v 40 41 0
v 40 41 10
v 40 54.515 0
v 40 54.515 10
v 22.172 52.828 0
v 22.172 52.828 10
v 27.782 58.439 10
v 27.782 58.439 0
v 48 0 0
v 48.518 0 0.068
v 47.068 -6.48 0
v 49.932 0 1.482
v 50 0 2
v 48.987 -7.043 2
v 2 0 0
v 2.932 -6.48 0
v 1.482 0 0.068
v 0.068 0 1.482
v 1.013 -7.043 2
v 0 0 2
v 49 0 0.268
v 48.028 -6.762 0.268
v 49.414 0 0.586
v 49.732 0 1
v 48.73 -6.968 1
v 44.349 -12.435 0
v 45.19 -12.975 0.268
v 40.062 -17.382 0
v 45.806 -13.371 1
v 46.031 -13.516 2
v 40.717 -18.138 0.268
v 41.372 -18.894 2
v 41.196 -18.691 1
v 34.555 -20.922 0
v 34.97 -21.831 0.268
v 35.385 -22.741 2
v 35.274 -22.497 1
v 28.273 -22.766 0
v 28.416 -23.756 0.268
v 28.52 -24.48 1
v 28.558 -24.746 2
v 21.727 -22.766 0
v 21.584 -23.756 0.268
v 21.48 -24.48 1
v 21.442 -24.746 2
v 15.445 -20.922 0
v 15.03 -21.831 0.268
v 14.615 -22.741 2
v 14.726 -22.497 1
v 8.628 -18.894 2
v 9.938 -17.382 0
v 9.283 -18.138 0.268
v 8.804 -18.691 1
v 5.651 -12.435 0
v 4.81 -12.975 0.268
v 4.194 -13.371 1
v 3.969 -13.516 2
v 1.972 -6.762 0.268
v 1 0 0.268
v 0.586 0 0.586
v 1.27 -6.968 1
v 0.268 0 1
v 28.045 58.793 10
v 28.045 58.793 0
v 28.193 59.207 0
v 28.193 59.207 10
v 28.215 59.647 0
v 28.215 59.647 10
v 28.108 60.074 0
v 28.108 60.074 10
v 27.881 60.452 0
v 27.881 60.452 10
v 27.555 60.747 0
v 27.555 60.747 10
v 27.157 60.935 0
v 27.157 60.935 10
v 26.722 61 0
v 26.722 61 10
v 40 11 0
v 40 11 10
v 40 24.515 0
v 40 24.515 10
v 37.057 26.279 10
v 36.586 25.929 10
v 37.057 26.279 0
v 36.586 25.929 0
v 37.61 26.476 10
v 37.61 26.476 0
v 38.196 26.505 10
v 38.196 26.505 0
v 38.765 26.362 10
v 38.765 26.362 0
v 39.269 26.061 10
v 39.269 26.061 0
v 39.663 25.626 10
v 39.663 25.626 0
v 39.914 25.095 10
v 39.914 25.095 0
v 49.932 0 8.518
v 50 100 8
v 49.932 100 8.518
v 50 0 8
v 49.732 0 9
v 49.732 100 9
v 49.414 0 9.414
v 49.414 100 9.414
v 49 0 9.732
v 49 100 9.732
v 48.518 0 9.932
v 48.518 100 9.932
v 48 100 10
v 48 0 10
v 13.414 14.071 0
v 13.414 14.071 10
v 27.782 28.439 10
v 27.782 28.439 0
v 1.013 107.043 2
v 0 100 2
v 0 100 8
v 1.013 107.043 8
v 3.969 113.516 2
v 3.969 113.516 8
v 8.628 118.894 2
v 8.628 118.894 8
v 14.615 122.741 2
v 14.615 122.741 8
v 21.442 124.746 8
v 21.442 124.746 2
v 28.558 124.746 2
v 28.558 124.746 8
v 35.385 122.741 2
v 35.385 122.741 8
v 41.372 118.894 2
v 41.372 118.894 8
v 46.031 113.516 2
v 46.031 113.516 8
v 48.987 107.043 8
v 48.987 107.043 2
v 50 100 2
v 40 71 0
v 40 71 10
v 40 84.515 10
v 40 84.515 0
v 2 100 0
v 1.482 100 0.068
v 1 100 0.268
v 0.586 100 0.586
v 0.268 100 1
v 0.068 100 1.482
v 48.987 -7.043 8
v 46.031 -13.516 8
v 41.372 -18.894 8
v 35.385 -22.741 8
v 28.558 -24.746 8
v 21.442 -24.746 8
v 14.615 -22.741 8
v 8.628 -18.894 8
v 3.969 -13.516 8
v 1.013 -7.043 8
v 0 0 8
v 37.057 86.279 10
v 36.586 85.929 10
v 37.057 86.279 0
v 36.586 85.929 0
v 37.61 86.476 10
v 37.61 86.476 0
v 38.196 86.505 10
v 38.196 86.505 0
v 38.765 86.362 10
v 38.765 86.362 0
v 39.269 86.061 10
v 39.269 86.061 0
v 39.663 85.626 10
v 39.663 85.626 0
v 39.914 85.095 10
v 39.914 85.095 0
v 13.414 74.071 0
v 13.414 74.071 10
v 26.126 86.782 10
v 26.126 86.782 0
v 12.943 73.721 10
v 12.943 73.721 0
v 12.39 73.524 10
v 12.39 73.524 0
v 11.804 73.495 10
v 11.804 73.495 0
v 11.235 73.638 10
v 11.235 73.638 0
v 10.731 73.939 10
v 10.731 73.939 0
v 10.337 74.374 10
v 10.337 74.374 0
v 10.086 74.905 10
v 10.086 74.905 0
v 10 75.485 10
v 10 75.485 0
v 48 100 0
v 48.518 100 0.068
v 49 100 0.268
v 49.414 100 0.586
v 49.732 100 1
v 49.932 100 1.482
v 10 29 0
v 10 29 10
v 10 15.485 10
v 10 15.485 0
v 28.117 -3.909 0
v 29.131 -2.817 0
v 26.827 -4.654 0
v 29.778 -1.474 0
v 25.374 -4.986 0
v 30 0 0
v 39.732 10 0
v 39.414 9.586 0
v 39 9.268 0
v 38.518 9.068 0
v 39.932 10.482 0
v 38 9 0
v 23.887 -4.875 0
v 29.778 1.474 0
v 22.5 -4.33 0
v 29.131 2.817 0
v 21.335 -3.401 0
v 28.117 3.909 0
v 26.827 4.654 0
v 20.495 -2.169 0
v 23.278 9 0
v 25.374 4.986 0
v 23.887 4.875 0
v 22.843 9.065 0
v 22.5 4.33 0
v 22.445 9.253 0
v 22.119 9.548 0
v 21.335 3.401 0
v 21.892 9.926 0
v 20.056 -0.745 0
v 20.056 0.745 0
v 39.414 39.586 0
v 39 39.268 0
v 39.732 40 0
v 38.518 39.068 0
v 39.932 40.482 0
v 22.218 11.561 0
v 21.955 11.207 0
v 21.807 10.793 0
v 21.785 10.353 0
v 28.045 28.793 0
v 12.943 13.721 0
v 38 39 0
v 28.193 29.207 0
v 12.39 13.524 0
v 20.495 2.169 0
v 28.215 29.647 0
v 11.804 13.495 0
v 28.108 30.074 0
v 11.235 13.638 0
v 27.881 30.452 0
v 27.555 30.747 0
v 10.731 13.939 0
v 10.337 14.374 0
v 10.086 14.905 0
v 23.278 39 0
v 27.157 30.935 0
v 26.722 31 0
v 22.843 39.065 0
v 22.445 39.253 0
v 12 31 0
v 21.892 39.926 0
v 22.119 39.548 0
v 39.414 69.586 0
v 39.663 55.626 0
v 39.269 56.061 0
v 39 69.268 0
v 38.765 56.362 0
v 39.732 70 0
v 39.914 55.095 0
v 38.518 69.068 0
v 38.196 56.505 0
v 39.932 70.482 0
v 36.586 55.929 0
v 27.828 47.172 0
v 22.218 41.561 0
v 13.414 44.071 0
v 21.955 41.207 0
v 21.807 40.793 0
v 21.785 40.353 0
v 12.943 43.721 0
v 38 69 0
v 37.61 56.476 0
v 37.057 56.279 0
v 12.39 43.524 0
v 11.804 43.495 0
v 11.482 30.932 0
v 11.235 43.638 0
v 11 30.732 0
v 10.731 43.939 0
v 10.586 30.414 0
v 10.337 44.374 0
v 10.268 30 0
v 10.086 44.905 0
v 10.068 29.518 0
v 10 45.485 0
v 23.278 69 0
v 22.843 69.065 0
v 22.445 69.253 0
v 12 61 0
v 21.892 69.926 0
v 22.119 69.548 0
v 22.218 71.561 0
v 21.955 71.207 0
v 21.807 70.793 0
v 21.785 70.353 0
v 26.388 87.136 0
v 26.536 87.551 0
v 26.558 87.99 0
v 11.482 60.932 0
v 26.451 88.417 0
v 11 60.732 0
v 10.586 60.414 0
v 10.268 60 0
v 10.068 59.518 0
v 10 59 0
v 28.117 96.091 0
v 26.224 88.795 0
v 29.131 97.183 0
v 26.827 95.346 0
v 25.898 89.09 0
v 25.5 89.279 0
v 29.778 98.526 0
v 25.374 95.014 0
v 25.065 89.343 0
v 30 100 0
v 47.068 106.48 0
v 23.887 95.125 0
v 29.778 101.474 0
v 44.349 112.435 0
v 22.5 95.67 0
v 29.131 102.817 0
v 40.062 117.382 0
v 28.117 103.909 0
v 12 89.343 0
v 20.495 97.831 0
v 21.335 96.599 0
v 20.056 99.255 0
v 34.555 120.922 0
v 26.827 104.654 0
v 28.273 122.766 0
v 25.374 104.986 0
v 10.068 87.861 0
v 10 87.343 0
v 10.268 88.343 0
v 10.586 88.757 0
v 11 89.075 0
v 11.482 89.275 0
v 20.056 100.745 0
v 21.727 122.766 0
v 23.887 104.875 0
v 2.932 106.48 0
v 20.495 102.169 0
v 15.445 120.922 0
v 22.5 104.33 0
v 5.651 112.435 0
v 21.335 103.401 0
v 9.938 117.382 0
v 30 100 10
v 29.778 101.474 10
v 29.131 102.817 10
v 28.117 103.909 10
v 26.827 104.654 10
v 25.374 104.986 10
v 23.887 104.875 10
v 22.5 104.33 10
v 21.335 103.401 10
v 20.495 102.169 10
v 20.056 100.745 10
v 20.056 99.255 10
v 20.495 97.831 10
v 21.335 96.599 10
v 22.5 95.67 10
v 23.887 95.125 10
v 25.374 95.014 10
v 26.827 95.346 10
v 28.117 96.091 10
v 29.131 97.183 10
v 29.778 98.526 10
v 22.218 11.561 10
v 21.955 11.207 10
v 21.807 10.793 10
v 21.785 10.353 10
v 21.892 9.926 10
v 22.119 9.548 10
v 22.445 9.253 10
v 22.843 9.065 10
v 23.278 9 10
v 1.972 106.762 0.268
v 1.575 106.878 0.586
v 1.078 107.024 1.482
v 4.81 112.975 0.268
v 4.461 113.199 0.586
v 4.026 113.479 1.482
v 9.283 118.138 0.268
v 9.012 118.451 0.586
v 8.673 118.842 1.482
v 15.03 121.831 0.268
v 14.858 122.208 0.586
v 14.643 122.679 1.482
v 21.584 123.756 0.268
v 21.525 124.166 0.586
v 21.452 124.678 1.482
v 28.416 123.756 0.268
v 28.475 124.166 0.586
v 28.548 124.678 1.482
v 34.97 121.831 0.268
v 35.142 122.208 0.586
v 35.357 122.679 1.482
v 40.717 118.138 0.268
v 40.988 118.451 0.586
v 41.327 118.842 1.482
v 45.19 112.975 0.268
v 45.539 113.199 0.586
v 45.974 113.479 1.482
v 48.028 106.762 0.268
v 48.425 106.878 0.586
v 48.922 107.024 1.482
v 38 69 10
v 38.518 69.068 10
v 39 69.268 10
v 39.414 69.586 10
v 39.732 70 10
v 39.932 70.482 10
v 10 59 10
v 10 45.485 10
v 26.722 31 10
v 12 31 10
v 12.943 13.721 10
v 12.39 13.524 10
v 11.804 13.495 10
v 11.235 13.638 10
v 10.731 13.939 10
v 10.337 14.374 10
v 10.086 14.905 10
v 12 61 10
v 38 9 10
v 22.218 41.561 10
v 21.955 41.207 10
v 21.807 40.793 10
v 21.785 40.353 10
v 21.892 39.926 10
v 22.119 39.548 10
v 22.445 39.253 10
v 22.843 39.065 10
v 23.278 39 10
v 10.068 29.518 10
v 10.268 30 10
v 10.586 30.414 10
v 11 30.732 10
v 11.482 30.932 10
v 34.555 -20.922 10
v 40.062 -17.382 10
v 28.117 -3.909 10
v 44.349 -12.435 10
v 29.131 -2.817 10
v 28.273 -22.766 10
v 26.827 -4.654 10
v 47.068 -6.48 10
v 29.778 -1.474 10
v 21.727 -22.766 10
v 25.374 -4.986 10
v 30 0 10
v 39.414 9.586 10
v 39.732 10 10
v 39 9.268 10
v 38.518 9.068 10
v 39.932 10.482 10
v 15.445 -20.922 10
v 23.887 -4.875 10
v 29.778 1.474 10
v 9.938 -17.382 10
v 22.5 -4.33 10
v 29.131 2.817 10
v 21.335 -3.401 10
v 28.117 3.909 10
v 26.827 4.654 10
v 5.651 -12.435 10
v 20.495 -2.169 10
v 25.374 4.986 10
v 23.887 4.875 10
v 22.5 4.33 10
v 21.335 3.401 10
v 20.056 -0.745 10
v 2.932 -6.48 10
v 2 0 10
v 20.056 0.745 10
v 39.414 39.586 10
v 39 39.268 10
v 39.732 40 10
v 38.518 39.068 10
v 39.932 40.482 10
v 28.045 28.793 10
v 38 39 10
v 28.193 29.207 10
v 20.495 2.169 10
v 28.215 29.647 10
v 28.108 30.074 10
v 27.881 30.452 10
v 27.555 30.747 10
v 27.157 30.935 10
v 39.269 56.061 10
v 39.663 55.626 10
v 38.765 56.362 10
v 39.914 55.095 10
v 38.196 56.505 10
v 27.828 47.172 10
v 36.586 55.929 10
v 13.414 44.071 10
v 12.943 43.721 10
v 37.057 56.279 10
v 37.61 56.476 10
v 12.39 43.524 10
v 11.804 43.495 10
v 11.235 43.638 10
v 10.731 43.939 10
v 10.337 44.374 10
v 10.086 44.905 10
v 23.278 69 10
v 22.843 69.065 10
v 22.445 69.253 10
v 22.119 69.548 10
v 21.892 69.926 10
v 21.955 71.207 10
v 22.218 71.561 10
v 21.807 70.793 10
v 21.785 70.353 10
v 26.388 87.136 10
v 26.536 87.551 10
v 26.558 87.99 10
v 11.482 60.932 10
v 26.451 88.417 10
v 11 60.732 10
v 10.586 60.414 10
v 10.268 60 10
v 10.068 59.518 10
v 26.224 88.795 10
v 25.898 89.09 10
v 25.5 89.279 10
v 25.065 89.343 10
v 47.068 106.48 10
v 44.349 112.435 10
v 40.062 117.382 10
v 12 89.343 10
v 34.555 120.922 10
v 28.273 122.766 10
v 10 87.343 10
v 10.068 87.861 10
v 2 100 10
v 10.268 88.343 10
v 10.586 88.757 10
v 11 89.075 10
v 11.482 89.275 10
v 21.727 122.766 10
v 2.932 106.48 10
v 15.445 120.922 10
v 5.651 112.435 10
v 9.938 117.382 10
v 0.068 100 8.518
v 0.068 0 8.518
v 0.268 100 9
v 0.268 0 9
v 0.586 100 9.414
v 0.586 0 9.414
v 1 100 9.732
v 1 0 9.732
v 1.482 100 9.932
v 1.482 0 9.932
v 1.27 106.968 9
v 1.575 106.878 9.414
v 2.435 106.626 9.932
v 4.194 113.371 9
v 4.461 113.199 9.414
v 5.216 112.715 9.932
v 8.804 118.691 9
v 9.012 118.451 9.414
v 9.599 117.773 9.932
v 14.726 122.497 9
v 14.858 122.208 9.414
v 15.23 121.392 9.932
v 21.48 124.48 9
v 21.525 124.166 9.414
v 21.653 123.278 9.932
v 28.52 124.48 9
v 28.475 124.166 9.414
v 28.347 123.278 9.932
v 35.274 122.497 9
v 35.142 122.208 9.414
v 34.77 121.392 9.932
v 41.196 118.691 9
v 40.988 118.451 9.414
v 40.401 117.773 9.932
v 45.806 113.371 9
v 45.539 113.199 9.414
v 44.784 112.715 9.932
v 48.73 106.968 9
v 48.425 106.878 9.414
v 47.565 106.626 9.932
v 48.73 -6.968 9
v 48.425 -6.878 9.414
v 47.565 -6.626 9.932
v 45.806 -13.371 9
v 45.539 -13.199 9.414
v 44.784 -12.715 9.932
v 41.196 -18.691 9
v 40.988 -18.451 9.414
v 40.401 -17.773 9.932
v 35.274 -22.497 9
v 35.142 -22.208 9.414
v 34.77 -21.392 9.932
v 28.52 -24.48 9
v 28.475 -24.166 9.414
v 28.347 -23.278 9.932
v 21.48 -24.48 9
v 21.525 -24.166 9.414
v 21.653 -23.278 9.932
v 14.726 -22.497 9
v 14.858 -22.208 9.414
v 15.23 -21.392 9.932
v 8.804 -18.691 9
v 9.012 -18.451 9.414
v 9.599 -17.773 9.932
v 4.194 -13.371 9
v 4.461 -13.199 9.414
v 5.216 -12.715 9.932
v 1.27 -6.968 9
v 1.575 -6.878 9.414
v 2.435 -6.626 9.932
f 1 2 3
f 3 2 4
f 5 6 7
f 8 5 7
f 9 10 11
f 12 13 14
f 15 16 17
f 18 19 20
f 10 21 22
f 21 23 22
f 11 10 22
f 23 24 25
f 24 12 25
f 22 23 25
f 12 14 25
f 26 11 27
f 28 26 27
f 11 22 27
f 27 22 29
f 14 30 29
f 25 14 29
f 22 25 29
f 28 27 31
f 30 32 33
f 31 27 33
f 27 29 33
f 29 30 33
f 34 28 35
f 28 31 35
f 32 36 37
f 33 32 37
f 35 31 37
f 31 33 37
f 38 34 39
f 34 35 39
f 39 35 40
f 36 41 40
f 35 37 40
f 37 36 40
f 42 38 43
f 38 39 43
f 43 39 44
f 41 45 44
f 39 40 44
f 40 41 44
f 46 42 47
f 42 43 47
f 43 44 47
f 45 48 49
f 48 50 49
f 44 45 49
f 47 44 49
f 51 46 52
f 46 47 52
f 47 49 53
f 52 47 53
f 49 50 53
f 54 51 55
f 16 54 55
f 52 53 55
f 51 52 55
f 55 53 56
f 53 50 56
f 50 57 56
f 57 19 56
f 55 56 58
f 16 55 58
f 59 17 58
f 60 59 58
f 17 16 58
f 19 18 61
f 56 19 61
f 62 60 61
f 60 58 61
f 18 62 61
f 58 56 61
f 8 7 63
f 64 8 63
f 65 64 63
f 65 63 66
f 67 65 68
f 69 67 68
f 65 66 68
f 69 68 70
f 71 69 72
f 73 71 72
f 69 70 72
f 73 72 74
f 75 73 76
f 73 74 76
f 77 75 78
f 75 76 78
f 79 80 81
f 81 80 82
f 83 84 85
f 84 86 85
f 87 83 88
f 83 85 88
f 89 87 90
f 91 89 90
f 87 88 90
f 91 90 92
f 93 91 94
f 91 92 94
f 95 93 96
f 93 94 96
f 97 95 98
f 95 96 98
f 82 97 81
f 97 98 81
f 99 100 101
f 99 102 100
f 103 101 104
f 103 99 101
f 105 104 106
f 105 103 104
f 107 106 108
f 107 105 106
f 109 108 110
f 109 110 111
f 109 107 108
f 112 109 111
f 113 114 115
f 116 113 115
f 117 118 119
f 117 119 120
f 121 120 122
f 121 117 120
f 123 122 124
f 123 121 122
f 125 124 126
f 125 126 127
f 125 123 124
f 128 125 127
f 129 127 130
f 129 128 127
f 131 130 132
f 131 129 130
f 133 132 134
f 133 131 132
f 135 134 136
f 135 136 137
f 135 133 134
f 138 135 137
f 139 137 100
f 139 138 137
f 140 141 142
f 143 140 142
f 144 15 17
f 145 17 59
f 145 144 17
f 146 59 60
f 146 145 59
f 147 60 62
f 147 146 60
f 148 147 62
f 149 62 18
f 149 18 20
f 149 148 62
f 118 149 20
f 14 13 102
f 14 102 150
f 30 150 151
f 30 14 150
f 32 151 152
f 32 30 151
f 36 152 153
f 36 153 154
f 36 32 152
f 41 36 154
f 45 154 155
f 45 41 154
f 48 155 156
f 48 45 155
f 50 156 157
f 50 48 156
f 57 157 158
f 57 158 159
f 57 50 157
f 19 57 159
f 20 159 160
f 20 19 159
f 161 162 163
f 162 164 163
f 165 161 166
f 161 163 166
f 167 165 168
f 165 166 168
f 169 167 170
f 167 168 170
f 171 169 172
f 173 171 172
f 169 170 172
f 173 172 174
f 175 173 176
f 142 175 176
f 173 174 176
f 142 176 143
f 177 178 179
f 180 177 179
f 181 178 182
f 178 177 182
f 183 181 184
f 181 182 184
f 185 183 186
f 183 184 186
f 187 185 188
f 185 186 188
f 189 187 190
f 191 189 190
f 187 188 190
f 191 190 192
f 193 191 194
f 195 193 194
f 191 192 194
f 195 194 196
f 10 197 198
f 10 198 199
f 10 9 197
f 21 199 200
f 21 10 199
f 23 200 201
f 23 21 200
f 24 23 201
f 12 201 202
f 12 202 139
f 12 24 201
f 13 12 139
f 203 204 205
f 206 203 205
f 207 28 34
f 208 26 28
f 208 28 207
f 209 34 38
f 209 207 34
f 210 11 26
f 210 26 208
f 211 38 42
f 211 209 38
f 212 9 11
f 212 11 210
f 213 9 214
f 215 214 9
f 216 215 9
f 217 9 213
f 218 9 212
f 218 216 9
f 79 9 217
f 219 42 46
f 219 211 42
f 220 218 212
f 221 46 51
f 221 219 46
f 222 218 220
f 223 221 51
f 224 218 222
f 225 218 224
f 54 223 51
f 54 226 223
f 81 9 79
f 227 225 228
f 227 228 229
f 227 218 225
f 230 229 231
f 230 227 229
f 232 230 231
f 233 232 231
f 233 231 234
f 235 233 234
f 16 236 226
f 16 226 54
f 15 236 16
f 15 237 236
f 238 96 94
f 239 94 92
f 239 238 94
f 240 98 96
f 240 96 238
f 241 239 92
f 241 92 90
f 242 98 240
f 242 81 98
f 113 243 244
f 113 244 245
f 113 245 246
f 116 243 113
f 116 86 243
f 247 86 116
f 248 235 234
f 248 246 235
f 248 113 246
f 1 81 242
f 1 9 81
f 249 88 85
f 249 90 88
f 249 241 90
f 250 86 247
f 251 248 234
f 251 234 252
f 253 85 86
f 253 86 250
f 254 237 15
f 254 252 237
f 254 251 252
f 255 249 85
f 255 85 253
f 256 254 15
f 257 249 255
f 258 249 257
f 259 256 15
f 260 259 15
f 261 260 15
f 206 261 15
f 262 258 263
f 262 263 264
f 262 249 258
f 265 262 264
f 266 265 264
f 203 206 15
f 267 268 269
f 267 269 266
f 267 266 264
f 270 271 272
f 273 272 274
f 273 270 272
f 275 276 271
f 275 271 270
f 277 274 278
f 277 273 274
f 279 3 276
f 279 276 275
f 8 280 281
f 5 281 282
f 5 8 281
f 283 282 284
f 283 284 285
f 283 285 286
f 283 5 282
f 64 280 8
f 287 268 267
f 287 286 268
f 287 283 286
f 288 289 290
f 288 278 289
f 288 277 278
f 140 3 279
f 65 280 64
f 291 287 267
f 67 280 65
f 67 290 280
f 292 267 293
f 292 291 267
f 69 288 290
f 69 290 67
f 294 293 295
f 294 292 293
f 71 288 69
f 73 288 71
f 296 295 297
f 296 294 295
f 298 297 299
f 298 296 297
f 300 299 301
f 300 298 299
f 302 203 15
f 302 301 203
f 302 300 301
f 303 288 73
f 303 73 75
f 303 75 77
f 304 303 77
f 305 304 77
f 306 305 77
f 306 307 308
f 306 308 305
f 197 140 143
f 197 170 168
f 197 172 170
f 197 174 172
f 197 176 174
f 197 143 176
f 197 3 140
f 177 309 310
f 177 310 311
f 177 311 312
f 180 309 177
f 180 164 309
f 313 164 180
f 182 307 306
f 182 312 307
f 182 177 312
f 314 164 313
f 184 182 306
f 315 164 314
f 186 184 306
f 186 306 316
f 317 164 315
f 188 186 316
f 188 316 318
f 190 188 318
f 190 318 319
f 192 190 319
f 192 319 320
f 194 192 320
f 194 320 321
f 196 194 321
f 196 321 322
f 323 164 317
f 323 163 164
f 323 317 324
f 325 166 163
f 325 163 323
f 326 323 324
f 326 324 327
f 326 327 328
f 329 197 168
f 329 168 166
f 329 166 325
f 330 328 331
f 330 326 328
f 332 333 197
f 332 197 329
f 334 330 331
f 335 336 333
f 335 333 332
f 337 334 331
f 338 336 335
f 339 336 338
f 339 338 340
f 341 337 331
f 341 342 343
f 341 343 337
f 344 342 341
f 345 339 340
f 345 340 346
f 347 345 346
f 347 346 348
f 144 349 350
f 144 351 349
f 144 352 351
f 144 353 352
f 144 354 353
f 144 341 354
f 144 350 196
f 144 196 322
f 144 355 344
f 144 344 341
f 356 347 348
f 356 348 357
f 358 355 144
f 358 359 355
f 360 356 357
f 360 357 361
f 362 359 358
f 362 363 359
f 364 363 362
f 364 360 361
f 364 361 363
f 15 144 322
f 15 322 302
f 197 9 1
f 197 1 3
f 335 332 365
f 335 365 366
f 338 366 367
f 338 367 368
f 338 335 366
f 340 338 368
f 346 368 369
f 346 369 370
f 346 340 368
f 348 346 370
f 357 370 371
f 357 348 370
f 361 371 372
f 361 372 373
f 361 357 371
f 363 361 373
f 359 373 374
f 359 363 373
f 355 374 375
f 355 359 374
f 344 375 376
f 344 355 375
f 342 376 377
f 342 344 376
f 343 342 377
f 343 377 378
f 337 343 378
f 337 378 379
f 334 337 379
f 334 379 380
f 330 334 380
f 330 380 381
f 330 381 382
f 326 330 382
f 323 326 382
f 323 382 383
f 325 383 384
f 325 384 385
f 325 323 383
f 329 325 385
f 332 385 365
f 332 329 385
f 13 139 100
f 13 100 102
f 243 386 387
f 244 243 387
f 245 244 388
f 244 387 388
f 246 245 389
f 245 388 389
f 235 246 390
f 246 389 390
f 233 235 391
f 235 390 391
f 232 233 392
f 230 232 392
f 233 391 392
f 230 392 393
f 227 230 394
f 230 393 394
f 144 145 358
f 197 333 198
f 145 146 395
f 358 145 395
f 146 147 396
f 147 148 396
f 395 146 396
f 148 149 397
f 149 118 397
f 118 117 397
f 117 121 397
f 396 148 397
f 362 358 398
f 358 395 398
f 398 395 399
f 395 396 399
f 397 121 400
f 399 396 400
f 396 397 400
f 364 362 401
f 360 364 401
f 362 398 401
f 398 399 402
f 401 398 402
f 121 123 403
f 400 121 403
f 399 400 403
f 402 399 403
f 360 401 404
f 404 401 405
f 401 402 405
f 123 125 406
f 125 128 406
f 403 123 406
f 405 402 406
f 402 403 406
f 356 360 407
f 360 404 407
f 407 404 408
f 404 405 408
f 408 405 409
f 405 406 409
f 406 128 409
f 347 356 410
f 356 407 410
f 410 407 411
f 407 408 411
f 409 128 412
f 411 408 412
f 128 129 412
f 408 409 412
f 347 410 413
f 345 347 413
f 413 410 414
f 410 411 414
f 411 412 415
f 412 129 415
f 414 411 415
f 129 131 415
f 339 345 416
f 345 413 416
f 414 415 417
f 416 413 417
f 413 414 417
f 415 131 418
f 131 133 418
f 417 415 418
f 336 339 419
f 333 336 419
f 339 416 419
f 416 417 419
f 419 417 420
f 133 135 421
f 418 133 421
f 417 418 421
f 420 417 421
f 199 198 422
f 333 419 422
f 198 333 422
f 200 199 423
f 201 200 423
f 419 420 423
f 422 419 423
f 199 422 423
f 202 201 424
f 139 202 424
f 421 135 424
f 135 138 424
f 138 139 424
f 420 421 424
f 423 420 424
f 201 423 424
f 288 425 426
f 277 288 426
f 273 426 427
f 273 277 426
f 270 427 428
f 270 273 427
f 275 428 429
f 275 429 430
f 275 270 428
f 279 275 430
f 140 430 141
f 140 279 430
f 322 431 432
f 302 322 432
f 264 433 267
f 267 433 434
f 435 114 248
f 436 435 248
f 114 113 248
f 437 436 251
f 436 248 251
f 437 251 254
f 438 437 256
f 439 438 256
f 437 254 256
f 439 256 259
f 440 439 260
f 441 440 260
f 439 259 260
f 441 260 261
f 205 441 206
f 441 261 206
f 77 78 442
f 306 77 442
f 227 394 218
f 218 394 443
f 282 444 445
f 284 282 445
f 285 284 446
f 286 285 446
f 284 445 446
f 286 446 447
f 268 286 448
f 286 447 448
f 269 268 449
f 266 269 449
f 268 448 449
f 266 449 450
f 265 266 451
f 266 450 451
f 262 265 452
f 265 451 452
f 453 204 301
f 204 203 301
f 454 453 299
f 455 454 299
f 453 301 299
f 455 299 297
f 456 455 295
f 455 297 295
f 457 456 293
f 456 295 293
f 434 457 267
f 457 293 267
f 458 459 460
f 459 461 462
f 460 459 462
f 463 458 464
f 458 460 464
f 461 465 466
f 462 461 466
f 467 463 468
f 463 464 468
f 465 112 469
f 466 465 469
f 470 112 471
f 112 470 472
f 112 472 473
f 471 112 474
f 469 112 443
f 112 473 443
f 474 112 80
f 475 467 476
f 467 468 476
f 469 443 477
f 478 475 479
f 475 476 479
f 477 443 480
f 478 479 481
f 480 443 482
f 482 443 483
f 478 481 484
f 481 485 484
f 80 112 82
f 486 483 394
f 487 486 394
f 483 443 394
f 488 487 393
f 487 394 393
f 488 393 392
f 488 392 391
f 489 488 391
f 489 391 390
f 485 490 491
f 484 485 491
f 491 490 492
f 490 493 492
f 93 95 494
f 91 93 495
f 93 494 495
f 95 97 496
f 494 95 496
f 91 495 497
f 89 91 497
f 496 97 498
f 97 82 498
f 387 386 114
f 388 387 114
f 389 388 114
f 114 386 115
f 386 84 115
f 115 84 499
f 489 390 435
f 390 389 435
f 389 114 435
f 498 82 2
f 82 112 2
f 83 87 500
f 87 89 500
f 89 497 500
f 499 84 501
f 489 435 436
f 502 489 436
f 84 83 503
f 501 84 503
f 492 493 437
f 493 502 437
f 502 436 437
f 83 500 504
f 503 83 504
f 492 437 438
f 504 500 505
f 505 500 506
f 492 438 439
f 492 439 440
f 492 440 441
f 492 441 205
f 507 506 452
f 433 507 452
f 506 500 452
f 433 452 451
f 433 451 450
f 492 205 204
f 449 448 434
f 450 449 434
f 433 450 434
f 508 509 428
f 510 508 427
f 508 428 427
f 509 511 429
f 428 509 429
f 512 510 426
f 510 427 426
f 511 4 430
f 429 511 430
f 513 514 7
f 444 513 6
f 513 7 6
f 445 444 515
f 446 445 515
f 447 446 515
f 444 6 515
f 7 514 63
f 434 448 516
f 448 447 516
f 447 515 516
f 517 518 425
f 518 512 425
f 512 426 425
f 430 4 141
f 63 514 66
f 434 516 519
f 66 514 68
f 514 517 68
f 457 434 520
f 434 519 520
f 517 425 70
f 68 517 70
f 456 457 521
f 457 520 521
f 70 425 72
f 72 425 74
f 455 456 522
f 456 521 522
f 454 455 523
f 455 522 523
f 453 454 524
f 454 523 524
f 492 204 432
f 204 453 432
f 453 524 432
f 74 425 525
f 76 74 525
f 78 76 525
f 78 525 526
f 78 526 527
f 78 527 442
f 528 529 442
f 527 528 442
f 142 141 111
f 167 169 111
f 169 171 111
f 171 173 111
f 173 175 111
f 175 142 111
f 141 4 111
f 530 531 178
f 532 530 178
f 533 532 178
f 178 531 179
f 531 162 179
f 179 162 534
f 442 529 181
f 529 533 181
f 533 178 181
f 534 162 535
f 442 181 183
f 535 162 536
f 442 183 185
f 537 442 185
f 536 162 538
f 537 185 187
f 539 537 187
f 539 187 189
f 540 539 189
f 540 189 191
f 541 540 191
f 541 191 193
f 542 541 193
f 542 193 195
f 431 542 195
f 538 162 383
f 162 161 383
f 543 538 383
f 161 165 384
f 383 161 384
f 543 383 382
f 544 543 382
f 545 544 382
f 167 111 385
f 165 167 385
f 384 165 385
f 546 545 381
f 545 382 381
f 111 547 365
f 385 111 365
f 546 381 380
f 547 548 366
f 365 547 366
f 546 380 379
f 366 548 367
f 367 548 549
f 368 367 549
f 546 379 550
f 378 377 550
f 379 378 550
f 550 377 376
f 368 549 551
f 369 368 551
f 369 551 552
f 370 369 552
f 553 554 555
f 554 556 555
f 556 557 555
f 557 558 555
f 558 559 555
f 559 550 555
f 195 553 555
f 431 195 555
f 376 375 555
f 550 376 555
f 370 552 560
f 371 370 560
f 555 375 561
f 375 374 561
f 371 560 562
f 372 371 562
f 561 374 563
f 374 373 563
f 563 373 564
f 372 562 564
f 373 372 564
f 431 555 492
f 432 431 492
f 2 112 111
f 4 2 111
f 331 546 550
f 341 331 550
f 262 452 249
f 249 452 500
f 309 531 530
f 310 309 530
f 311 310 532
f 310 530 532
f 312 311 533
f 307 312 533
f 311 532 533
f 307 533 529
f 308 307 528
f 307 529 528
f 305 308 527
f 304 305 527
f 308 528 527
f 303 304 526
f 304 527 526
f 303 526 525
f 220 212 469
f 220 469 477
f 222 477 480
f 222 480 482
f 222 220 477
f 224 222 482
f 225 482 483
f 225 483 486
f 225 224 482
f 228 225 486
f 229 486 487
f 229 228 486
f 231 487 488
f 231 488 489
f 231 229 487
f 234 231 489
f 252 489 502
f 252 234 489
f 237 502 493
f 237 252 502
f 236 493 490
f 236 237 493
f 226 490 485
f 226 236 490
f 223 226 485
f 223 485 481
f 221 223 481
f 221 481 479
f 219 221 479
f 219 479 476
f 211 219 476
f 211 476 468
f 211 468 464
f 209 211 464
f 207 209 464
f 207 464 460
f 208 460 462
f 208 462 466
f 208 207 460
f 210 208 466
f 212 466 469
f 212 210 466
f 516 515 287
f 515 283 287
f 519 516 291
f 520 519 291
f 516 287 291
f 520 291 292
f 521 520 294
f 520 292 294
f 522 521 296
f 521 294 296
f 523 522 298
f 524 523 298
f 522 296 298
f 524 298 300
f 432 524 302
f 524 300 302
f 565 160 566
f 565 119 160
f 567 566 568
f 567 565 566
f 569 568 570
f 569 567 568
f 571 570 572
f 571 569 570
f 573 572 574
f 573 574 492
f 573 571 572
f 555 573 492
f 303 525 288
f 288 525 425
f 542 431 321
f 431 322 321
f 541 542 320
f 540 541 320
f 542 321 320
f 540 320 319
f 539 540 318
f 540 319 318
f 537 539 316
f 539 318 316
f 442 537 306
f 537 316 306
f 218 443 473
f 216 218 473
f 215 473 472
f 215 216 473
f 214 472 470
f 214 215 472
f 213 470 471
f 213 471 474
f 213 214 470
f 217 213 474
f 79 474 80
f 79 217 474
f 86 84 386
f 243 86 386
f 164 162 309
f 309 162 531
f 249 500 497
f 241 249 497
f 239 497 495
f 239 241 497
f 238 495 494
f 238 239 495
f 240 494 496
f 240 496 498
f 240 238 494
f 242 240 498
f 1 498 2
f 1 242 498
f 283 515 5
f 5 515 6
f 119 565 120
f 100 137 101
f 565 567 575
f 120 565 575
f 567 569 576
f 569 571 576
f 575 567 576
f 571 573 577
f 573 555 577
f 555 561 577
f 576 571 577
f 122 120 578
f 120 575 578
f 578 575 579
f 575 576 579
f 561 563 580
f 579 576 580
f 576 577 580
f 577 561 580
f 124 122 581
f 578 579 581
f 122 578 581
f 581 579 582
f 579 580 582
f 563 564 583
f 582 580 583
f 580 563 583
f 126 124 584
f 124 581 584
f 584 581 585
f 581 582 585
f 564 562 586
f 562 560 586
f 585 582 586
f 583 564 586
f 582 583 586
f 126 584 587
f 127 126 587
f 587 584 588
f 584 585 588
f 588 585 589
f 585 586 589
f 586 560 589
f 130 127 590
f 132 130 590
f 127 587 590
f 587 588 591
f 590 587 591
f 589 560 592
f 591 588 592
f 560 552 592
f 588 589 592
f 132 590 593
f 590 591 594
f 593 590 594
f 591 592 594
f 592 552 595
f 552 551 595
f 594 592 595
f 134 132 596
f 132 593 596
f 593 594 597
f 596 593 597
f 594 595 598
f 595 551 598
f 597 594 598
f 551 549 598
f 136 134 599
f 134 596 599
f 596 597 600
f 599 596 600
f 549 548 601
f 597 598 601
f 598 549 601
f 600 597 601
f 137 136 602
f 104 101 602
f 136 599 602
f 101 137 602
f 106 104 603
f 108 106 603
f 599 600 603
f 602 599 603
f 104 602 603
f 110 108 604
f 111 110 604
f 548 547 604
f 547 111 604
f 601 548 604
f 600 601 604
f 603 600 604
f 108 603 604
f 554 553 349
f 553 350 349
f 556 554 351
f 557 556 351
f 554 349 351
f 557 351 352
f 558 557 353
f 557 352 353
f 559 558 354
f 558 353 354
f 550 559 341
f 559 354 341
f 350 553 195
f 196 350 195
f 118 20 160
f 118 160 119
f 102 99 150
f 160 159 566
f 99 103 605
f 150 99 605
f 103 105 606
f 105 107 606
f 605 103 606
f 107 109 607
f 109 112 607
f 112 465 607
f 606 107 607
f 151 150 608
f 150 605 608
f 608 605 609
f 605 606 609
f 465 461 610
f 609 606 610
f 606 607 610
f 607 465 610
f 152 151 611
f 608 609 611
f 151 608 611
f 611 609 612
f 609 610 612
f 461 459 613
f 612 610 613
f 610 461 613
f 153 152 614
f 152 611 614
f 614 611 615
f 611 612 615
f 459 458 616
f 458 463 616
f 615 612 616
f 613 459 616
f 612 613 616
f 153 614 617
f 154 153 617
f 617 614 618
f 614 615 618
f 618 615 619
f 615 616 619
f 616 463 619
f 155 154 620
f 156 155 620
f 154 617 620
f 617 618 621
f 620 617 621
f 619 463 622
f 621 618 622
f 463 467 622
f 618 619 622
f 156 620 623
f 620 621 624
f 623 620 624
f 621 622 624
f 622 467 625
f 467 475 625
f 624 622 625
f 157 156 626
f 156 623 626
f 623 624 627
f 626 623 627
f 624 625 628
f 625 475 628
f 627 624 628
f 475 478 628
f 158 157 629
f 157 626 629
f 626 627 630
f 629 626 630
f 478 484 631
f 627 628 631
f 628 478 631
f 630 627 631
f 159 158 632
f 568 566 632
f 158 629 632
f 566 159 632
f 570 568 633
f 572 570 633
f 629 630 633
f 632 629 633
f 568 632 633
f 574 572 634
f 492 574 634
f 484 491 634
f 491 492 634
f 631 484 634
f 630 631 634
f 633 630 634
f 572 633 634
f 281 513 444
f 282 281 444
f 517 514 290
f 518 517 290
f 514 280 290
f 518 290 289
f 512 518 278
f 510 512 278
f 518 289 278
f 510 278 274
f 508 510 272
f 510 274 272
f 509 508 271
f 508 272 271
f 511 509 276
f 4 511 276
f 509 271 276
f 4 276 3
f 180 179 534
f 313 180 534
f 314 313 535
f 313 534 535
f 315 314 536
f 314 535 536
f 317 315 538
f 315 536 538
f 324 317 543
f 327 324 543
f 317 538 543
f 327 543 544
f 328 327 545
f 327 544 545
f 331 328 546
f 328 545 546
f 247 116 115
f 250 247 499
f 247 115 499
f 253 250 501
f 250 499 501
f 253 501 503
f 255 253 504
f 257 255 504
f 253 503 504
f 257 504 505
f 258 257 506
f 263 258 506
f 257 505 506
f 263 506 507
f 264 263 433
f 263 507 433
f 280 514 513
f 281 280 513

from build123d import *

# Parameters (mm, degrees)
SKETCH1_R           = 5
BOSS_EXTRUDE1_DEPTH = 10
CUT_EXTRUDE2_DEPTH  = 10
FILLET1_R           = 2
FILLET2_R           = 2


with BuildPart() as part:
    # Sketch1 → Boss-Extrude1 (new body)
    # profile 1 of 2: a face of its own
    with BuildSketch(Plane.XY):
        with BuildLine():
            Line((0, 0), (0, 100))
            ThreePointArc((0, 100), (25, 125), (50, 100))
            Line((50, 100), (50, 0))
            ThreePointArc((50, 0), (25, -25), (0, 0))
        make_face()
        with BuildLine():
            ThreePointArc((15, 0), (25, -10), (35, 0))
            Line((35, 0), (35, 100))
            ThreePointArc((35, 100), (25, 110), (15, 100))
            Line((15, 100), (15, 0))
        make_face(mode=Mode.SUBTRACT)
    # profile 2 of 2: a face of its own
    with BuildSketch(Plane.XY):
        with BuildLine():
            Line((15, 0), (15, 100))
            ThreePointArc((15, 100), (25, 110), (35, 100))
            Line((35, 100), (35, 0))
            ThreePointArc((35, 0), (25, -10), (15, 0))
        make_face()
        with Locations((25, 0)):
            Circle(SKETCH1_R, mode=Mode.SUBTRACT)
        with Locations((25, 100)):
            Circle(SKETCH1_R, mode=Mode.SUBTRACT)
    extrude(amount=BOSS_EXTRUDE1_DEPTH)

    # Sketch2 → Cut-Extrude2 (cut)
    with BuildSketch(Plane.XY.offset(10)):
        with BuildLine():
            Line((25.064971157, 89.343145751), (10, 89.343145751))
            Line((10, 89.343145751), (10, 70.656854249))
            Line((10, 70.656854249), (26.125631329, 86.782485579))
            ThreePointArc((26.125631329, 86.782485579), (26.450790456, 88.417170899), (25.064971157, 89.343145751))
        make_face()
        with BuildLine():
            Line((40, 69), (40, 89.343145751))
            Line((40, 89.343145751), (22.217514421, 71.560660172))
            ThreePointArc((22.217514421, 71.560660172), (21.892355294, 69.925974851), (23.278174593, 69))
            Line((23.278174593, 69), (40, 69))
        make_face()
        with BuildLine():
            Line((26.721825407, 61), (10, 61))
            Line((10, 61), (10, 40.65685425))
            Line((10, 40.65685425), (22.171572875, 52.828427125))
            Line((22.171572875, 52.828427125), (27.782485579, 58.439339828))
            ThreePointArc((27.782485579, 58.439339828), (28.107644706, 60.074025149), (26.721825407, 61))
        make_face()
        with BuildLine():
            Line((40, 39), (40, 59.343145751))
            Line((40, 59.343145751), (27.828427125, 47.171572875))
            Line((27.828427125, 47.171572875), (22.217514421, 41.560660172))
            ThreePointArc((22.217514421, 41.560660172), (21.892355294, 39.925974852), (23.278174593, 39))
            Line((23.278174593, 39), (40, 39))
        make_face()
        with BuildLine():
            Line((26.721825408, 31.000000001), (10, 31.000000001))
            Line((10, 31.000000001), (10, 10.656854249))
            Line((10, 10.656854249), (27.782485579, 28.439339829))
            ThreePointArc((27.782485579, 28.439339829), (28.107644706, 30.074025149), (26.721825408, 31.000000001))
        make_face()
        with BuildLine():
            Line((40, 9), (40, 29.34314575))
            Line((40, 29.34314575), (22.217514422, 11.560660171))
            ThreePointArc((22.217514422, 11.560660171), (21.892355295, 9.925974851), (23.278174594, 9))
            Line((23.278174594, 9), (40, 9))
        make_face()
    extrude(amount=-CUT_EXTRUDE2_DEPTH, mode=Mode.SUBTRACT)

    # Fillet1
    fillet1_edges = [part.edges().sort_by_distance(p)[0] for p in [
        (10, 10.656854249, 5),
        (10, 31.000000001, 5),
        (40, 59.343145751, 5),
        (40, 39, 5),
        (10, 40.65685425, 5),
        (10, 61, 5),
        (40, 89.343145751, 5),
        (40, 69, 5),
        (40, 29.34314575, 5),
        (40, 9, 5),
        (10, 70.656854249, 5),
        (10, 89.343145751, 5),
    ]]
    fillet(fillet1_edges, radius=FILLET1_R)

    # Fillet2
    fillet2_edges = [part.edges().sort_by_distance(p)[0] for p in [
        (25, -25, 0),
        (0, 50, 0),
        (25, -25, 10),
        (50, 50, 10),
        (25, 125, 10),
        (0, 50, 10),
        (25, 125, 0),
        (50, 50, 0),
    ]]
    fillet(fillet2_edges, radius=FILLET2_R)


solid = part.part
